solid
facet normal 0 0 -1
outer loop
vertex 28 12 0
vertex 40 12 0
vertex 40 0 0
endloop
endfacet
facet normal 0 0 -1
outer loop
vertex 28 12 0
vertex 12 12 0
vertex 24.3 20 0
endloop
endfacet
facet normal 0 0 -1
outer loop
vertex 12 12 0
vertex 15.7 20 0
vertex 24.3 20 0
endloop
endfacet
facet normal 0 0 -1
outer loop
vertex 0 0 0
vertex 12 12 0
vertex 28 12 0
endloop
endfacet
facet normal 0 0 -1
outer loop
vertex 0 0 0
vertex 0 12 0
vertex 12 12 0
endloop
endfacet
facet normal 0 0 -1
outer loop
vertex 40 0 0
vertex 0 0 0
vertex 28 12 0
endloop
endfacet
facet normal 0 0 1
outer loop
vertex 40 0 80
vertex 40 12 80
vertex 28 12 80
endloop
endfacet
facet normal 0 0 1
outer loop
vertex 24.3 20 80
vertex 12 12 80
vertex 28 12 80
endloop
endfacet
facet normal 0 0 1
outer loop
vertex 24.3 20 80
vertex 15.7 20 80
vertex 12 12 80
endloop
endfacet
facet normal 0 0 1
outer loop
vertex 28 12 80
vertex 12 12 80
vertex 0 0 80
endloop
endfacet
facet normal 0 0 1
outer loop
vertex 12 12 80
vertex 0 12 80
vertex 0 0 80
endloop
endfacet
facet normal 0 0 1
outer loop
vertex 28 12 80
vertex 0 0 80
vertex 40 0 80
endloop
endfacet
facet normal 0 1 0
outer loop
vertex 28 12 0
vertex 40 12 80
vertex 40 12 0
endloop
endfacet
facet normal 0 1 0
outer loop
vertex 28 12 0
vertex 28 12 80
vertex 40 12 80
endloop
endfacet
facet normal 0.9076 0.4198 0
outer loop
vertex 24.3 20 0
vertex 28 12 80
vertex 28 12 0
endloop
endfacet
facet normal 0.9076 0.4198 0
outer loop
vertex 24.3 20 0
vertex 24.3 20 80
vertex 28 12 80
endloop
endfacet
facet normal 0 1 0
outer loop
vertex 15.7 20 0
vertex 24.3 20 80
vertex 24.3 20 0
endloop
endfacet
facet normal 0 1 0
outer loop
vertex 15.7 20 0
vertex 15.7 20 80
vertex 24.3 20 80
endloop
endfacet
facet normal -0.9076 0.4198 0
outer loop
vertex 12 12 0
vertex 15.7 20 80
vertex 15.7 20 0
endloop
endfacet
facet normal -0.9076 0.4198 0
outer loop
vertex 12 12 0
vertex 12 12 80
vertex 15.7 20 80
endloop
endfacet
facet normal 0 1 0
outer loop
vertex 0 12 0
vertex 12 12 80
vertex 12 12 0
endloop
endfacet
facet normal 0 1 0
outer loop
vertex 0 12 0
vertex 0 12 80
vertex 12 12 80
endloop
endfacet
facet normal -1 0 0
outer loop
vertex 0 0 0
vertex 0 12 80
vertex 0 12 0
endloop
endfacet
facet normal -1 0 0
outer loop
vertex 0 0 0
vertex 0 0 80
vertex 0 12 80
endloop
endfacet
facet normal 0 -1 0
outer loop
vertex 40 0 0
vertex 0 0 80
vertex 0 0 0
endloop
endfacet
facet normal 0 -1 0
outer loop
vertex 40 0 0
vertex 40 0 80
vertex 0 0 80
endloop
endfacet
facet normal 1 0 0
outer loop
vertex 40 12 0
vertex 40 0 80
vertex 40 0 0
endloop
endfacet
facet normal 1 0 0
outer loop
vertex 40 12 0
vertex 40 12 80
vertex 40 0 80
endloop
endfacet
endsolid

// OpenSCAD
$fn = 32;

// ----------------------------------------------------------------------
// V guide rail: dovetail, 40 mm wide
// ----------------------------------------------------------------------

// --- parameters (mm) ---
rail_w = 40;              // rail width, X
base_t = 12;              // base plate thickness
v_depth = 8;              // V feature depth / height
v_half_w = 8;             // half width of the V at the base face
plate_t = 80;             // rail length, Z (the extrusion height)
top_half_w = 4.3;         // half width at the dovetail top

dovetail_base = 2 * v_half_w;  // dovetail width at the base
dovetail_top = 2 * top_half_w;  // dovetail width at the top

profile = [[0, 0], [40, 0], [40, 12], [28, 12], [24.3, 20], [15.7, 20], [12, 12], [0, 12]];  // primary outline, 8 points, counter clockwise

// --- the one profile operation ---
linear_extrude(height = plate_t) polygon(points = profile);
